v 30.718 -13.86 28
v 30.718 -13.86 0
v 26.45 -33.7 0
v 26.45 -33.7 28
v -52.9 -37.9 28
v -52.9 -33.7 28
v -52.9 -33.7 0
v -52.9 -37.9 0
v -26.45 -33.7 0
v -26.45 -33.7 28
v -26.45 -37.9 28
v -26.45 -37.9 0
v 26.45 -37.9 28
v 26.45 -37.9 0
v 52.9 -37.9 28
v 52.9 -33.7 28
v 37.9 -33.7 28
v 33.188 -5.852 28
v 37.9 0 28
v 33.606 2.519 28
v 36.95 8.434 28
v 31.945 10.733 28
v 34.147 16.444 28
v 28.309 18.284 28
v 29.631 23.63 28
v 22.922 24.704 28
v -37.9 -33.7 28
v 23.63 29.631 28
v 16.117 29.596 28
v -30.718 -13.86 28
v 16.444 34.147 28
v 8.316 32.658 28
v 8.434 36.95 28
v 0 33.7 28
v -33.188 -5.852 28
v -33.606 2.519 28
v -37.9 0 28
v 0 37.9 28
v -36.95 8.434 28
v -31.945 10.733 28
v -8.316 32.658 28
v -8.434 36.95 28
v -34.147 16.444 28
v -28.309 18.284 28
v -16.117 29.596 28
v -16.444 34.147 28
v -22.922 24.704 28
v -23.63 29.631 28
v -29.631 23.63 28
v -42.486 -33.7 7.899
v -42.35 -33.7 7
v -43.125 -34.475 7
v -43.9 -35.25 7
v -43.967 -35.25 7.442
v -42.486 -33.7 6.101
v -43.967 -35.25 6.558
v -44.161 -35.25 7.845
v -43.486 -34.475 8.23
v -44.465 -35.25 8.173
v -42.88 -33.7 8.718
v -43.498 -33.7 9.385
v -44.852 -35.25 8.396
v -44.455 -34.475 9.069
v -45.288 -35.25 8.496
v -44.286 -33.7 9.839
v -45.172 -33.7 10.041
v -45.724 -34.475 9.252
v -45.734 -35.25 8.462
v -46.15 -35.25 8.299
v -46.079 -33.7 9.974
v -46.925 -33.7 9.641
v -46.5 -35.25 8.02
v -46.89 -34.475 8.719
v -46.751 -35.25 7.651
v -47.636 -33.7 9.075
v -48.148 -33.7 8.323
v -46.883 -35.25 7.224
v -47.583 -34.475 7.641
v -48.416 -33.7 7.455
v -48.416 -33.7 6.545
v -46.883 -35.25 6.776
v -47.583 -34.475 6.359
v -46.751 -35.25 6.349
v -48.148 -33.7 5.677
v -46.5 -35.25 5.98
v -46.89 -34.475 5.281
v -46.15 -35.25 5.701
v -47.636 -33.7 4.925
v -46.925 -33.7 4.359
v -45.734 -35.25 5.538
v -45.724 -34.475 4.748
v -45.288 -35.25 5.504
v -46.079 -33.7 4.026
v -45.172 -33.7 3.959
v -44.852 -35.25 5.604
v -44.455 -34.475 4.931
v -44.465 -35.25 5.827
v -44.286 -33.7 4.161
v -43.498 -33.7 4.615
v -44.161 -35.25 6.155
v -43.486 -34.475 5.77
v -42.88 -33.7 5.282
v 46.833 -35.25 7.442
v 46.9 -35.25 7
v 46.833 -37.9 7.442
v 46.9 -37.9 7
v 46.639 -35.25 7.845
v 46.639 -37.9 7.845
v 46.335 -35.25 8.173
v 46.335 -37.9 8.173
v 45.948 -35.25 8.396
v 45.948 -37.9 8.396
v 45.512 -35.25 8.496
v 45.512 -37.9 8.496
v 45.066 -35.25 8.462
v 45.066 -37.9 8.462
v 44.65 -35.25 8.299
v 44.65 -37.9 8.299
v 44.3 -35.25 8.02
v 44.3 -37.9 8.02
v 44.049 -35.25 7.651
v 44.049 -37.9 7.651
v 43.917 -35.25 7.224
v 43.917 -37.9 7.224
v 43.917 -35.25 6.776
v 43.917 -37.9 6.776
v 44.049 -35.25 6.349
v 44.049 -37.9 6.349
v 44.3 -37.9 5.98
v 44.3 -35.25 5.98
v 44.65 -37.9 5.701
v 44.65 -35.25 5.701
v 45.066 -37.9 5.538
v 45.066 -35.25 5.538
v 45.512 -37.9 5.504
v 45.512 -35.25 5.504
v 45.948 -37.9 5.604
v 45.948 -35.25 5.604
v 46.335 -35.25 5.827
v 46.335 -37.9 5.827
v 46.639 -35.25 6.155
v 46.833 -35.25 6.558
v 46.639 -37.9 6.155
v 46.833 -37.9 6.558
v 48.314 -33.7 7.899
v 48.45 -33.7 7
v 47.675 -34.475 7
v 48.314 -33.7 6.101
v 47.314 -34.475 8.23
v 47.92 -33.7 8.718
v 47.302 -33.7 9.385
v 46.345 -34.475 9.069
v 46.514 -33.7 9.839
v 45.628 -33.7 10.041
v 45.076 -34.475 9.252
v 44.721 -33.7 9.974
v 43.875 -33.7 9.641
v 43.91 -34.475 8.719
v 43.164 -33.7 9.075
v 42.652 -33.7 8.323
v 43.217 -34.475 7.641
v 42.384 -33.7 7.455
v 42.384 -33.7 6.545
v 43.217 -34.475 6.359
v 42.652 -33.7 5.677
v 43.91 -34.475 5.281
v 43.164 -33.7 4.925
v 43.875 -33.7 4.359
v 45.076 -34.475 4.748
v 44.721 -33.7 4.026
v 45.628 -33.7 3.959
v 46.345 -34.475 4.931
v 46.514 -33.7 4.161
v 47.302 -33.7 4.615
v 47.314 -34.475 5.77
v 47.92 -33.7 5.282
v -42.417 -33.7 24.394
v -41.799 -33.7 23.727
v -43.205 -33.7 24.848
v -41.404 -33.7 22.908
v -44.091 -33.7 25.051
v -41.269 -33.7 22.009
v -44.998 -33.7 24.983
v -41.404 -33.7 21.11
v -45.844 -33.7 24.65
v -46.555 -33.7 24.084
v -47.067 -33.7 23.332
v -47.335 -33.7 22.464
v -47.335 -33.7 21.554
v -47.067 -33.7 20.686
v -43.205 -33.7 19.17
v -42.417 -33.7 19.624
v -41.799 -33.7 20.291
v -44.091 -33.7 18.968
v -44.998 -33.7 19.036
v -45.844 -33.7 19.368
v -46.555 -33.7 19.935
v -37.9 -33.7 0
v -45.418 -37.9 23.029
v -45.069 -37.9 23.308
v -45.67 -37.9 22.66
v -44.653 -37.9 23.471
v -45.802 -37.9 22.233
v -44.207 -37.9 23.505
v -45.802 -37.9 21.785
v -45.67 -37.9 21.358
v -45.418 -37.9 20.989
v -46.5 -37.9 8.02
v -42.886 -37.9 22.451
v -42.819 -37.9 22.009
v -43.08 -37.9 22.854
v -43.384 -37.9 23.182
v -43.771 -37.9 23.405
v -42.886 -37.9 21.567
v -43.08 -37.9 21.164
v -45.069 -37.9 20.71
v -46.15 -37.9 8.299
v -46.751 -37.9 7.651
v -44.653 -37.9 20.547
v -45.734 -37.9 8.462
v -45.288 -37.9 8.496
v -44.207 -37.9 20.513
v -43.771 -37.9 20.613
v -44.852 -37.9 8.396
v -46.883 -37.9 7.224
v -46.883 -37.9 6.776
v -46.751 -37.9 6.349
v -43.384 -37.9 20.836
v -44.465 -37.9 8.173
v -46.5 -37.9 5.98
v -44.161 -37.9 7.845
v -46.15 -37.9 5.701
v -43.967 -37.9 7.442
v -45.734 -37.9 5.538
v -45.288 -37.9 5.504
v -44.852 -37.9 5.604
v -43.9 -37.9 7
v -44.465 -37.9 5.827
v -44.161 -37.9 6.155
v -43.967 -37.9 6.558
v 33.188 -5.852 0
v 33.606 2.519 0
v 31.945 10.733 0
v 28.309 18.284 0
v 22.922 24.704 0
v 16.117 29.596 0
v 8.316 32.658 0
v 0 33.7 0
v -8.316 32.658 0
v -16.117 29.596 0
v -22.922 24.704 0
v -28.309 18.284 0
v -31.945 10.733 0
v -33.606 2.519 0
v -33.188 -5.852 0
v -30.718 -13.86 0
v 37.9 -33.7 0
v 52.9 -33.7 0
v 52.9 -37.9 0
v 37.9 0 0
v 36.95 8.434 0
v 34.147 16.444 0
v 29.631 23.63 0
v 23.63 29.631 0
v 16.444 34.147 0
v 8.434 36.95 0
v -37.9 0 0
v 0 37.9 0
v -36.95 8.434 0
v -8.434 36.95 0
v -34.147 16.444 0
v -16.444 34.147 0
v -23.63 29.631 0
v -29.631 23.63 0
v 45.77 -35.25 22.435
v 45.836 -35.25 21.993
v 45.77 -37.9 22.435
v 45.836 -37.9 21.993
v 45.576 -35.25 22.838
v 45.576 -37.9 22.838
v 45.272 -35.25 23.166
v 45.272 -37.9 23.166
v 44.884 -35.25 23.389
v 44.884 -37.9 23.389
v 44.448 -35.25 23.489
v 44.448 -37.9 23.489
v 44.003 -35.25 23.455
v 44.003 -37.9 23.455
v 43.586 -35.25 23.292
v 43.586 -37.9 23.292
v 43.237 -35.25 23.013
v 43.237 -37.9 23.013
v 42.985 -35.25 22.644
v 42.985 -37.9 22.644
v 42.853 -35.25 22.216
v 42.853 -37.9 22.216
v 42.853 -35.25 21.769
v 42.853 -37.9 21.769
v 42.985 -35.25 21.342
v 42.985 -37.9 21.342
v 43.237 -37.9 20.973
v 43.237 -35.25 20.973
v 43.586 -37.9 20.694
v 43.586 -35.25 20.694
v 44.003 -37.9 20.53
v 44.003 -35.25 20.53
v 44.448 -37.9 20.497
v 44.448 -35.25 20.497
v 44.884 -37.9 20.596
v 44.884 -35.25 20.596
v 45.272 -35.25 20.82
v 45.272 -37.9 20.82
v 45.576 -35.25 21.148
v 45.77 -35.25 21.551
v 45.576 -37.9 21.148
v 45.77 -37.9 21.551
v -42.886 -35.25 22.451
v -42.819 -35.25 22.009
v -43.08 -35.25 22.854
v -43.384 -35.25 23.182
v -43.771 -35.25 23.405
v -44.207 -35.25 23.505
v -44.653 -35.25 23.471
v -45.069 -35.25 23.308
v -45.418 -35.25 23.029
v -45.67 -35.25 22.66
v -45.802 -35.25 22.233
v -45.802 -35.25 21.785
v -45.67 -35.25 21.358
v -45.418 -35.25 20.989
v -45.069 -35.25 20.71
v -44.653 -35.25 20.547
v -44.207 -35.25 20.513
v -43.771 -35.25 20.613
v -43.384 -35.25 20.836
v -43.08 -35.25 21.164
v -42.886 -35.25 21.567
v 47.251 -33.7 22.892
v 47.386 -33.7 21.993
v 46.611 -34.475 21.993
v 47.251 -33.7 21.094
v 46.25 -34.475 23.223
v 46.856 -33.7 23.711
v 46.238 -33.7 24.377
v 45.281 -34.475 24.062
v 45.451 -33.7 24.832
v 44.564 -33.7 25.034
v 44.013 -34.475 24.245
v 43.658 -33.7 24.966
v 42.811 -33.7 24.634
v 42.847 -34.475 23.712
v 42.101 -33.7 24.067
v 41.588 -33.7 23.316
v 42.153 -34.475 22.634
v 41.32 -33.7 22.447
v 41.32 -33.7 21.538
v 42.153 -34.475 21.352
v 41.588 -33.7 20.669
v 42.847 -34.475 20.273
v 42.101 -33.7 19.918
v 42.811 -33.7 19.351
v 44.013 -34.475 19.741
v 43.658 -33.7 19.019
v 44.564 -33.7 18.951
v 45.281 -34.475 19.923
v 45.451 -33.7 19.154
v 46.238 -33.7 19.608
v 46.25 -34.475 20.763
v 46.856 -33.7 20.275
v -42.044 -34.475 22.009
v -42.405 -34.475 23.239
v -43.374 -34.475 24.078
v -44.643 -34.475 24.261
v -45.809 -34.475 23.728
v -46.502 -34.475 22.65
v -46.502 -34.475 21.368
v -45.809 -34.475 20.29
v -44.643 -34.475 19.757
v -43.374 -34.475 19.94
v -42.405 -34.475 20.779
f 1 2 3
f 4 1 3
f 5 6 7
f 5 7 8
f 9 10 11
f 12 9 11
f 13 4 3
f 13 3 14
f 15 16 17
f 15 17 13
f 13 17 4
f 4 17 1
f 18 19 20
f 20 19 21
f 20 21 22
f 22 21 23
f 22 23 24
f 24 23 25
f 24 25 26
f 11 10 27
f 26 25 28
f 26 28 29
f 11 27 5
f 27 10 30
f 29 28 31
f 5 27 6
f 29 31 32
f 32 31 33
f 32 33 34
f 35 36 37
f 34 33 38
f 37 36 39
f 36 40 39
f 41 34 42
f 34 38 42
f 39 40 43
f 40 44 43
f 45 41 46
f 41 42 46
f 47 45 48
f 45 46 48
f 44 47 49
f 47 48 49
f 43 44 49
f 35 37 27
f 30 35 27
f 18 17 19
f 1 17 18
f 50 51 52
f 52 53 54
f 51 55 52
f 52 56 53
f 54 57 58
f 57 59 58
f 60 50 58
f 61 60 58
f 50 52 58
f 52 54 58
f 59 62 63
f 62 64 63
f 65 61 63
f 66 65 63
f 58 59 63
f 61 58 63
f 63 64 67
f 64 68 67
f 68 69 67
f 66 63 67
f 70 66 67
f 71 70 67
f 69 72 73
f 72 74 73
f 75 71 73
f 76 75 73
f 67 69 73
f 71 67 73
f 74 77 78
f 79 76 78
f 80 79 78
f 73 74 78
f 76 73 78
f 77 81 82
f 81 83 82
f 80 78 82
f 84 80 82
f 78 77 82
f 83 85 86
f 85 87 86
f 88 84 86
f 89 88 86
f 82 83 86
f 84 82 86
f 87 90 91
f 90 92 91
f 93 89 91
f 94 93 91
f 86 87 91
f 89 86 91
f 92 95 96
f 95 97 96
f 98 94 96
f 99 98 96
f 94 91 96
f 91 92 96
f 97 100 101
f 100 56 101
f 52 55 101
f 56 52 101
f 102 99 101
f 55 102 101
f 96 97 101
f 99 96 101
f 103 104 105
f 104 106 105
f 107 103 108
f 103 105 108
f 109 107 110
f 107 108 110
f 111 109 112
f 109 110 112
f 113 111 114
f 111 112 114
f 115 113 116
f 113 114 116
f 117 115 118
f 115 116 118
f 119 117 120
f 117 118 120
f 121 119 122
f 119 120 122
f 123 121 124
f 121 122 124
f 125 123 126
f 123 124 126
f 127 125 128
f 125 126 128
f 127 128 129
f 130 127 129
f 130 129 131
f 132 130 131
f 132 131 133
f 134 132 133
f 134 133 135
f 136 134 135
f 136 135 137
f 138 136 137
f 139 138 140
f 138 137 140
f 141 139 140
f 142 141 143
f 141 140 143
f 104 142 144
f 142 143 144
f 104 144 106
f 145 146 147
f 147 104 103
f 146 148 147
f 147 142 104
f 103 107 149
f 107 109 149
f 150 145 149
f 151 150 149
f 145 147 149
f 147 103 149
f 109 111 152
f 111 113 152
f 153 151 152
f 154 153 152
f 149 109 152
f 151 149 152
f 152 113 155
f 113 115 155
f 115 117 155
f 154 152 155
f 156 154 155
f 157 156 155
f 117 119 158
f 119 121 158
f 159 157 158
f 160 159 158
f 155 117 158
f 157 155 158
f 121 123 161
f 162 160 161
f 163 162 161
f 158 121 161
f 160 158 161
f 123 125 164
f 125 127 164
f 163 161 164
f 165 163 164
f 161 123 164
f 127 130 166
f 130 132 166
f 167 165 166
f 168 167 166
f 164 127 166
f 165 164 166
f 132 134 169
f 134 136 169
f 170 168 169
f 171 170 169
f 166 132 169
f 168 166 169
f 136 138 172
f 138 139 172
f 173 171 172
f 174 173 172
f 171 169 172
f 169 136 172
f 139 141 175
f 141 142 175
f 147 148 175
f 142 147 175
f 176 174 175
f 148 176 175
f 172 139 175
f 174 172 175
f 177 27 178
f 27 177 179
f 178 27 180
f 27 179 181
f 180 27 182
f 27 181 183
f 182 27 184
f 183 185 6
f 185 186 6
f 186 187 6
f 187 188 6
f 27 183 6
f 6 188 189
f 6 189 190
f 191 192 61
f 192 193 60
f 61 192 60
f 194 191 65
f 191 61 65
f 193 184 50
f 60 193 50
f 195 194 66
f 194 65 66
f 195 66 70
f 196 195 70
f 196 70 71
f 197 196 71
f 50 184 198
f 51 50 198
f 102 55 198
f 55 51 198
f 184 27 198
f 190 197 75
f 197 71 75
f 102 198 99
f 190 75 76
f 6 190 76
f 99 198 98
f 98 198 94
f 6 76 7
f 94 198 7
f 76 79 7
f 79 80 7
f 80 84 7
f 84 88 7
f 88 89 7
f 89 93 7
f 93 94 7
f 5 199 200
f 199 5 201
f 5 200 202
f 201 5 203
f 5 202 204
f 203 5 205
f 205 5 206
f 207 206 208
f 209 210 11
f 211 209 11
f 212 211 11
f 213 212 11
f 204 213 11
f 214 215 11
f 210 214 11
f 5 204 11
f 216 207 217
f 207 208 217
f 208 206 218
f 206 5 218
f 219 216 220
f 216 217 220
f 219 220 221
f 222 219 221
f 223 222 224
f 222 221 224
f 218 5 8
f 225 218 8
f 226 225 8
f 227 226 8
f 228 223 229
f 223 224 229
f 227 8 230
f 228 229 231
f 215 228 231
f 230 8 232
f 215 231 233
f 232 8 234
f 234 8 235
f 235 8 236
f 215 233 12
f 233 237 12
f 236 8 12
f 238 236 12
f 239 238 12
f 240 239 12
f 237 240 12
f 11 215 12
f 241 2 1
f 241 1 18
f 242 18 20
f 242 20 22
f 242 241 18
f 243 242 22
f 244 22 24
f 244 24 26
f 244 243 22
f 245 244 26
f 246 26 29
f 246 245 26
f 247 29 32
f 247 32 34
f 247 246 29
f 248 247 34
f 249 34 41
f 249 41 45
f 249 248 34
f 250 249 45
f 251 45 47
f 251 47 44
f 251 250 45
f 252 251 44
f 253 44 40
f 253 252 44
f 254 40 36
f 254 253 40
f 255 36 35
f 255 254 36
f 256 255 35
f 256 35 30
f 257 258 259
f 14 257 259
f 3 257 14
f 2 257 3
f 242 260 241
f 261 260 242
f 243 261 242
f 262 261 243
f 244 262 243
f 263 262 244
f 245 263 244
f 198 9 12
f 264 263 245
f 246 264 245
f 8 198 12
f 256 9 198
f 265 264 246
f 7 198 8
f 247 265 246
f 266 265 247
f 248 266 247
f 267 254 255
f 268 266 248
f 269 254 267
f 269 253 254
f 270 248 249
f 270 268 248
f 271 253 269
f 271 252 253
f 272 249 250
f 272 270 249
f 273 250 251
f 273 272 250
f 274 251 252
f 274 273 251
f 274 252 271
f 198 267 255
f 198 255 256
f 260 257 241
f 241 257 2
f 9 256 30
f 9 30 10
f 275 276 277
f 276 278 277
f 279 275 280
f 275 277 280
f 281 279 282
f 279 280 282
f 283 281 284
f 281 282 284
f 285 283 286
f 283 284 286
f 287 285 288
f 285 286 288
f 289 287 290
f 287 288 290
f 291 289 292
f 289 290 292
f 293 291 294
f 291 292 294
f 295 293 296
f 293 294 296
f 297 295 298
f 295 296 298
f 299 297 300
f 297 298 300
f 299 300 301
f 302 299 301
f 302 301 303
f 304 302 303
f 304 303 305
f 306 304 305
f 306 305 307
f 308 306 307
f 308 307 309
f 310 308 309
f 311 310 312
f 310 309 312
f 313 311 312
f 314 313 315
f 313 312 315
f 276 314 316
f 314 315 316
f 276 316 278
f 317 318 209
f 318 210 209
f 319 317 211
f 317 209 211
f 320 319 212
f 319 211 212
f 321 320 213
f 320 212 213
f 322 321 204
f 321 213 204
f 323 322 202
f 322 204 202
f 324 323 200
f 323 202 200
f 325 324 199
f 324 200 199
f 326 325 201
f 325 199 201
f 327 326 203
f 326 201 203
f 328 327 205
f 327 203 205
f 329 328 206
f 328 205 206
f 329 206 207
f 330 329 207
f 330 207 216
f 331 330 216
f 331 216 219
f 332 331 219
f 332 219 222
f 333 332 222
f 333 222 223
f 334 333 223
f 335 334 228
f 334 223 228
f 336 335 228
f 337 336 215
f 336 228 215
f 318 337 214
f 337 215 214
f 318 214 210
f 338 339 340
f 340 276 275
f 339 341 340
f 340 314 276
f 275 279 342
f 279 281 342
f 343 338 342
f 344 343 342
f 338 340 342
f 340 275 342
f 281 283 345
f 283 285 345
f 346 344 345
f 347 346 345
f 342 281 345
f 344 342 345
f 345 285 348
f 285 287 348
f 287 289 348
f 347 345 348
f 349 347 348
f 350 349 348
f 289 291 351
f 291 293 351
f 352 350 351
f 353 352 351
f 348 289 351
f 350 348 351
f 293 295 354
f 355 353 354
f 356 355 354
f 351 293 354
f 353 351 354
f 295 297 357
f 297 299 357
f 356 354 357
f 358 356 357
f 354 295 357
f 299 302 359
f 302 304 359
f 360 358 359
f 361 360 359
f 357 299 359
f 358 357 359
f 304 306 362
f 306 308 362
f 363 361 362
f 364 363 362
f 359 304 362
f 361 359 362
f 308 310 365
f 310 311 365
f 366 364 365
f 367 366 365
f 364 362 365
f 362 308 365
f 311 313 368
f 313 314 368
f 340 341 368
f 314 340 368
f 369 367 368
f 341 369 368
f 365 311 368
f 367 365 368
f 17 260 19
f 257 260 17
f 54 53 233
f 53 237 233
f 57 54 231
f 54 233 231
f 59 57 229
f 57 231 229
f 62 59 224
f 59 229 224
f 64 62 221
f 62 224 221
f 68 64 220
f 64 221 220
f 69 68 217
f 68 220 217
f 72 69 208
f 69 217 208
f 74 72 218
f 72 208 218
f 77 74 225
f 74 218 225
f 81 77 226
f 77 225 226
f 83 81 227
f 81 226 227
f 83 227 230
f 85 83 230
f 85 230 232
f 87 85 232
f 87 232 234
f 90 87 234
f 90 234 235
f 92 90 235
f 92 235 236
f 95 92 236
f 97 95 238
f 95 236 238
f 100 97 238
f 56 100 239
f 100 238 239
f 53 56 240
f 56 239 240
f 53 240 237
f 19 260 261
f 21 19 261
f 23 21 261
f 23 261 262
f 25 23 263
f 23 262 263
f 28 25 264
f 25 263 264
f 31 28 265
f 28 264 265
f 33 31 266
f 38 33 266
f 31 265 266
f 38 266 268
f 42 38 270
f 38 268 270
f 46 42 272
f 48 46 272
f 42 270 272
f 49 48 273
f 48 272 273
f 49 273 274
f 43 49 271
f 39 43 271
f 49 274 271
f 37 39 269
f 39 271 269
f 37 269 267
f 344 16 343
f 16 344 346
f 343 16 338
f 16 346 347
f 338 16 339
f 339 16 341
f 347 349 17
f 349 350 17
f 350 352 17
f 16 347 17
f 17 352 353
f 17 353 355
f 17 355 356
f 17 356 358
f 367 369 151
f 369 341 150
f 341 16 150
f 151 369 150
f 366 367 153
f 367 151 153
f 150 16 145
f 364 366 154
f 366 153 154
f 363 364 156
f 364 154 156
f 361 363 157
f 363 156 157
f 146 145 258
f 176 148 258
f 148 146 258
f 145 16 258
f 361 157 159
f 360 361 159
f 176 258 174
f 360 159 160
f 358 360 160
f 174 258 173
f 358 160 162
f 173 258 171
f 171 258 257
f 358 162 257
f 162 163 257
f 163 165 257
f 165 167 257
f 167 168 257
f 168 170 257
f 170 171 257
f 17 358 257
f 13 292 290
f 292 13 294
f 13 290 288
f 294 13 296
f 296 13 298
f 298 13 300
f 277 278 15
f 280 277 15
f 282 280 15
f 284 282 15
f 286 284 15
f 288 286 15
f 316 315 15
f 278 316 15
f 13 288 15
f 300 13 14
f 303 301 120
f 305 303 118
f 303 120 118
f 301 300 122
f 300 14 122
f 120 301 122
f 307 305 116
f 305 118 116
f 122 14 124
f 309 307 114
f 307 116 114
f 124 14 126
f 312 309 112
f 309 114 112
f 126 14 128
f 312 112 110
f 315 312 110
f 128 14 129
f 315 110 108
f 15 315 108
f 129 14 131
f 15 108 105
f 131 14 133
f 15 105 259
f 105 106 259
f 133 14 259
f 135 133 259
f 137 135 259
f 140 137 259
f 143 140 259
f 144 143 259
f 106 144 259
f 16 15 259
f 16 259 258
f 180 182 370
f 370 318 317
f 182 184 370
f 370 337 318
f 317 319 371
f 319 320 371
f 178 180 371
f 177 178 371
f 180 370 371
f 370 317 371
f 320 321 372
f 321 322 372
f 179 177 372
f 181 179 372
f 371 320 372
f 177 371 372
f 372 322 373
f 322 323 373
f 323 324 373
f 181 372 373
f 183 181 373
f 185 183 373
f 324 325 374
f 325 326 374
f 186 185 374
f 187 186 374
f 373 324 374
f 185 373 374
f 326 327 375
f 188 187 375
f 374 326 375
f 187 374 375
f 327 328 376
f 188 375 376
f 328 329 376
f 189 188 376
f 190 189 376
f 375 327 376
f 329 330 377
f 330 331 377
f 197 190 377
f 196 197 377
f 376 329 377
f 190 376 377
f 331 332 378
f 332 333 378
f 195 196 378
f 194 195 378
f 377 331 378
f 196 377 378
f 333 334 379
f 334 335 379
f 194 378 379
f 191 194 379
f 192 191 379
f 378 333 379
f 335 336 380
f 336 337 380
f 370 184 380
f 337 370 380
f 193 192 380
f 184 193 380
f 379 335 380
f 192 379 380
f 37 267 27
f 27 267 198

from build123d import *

# Parameters (mm, degrees)
PAD_DEPTH        = 28
HOLE_D           = 3
HOLE_DEPTH       = 25
HOLE_CSINK_D     = 6.1
HOLE_CSINK_ANGLE = 90


with BuildPart() as part:
    # Sketch → Pad (new body)
    with BuildSketch(Plane.XY):
        with BuildLine():
            ThreePointArc((30.717917, -13.86), (0, 33.7), (-30.717917, -13.86))
            Line((-30.717917, -13.86), (-26.45, -33.7))
            Line((-26.45, -33.7), (-26.45, -37.9))
            Line((-52.9, -37.9), (-26.45, -37.9))
            Line((-52.9, -33.7), (-52.9, -37.9))
            Line((-37.9, -33.7), (-52.9, -33.7))
            Line((-37.9, 0), (-37.9, -33.7))
            ThreePointArc((37.9, 0), (0, 37.9), (-37.9, 0))
            Line((37.9, 0), (37.9, -33.7))
            Line((52.9, -33.7), (37.9, -33.7))
            Line((52.9, -37.9), (52.9, -33.7))
            Line((26.45, -37.9), (52.9, -37.9))
            Line((26.45, -33.7), (26.45, -37.9))
            Line((30.717917, -13.86), (26.45, -33.7))
        make_face()
    extrude(amount=PAD_DEPTH)

    # Hole
    with Locations(Plane(origin=(0, -33.7, 0), x_dir=(-1, 0, 0), z_dir=(0, 1, 0))):
        with Locations((45.4, 7), (-45.4, 7), (-44.336327, 21.992761), (44.318888, 22.009038)):
            CounterSinkHole(HOLE_D / 2, HOLE_CSINK_D / 2, depth=HOLE_DEPTH, counter_sink_angle=HOLE_CSINK_ANGLE)


solid = part.part
